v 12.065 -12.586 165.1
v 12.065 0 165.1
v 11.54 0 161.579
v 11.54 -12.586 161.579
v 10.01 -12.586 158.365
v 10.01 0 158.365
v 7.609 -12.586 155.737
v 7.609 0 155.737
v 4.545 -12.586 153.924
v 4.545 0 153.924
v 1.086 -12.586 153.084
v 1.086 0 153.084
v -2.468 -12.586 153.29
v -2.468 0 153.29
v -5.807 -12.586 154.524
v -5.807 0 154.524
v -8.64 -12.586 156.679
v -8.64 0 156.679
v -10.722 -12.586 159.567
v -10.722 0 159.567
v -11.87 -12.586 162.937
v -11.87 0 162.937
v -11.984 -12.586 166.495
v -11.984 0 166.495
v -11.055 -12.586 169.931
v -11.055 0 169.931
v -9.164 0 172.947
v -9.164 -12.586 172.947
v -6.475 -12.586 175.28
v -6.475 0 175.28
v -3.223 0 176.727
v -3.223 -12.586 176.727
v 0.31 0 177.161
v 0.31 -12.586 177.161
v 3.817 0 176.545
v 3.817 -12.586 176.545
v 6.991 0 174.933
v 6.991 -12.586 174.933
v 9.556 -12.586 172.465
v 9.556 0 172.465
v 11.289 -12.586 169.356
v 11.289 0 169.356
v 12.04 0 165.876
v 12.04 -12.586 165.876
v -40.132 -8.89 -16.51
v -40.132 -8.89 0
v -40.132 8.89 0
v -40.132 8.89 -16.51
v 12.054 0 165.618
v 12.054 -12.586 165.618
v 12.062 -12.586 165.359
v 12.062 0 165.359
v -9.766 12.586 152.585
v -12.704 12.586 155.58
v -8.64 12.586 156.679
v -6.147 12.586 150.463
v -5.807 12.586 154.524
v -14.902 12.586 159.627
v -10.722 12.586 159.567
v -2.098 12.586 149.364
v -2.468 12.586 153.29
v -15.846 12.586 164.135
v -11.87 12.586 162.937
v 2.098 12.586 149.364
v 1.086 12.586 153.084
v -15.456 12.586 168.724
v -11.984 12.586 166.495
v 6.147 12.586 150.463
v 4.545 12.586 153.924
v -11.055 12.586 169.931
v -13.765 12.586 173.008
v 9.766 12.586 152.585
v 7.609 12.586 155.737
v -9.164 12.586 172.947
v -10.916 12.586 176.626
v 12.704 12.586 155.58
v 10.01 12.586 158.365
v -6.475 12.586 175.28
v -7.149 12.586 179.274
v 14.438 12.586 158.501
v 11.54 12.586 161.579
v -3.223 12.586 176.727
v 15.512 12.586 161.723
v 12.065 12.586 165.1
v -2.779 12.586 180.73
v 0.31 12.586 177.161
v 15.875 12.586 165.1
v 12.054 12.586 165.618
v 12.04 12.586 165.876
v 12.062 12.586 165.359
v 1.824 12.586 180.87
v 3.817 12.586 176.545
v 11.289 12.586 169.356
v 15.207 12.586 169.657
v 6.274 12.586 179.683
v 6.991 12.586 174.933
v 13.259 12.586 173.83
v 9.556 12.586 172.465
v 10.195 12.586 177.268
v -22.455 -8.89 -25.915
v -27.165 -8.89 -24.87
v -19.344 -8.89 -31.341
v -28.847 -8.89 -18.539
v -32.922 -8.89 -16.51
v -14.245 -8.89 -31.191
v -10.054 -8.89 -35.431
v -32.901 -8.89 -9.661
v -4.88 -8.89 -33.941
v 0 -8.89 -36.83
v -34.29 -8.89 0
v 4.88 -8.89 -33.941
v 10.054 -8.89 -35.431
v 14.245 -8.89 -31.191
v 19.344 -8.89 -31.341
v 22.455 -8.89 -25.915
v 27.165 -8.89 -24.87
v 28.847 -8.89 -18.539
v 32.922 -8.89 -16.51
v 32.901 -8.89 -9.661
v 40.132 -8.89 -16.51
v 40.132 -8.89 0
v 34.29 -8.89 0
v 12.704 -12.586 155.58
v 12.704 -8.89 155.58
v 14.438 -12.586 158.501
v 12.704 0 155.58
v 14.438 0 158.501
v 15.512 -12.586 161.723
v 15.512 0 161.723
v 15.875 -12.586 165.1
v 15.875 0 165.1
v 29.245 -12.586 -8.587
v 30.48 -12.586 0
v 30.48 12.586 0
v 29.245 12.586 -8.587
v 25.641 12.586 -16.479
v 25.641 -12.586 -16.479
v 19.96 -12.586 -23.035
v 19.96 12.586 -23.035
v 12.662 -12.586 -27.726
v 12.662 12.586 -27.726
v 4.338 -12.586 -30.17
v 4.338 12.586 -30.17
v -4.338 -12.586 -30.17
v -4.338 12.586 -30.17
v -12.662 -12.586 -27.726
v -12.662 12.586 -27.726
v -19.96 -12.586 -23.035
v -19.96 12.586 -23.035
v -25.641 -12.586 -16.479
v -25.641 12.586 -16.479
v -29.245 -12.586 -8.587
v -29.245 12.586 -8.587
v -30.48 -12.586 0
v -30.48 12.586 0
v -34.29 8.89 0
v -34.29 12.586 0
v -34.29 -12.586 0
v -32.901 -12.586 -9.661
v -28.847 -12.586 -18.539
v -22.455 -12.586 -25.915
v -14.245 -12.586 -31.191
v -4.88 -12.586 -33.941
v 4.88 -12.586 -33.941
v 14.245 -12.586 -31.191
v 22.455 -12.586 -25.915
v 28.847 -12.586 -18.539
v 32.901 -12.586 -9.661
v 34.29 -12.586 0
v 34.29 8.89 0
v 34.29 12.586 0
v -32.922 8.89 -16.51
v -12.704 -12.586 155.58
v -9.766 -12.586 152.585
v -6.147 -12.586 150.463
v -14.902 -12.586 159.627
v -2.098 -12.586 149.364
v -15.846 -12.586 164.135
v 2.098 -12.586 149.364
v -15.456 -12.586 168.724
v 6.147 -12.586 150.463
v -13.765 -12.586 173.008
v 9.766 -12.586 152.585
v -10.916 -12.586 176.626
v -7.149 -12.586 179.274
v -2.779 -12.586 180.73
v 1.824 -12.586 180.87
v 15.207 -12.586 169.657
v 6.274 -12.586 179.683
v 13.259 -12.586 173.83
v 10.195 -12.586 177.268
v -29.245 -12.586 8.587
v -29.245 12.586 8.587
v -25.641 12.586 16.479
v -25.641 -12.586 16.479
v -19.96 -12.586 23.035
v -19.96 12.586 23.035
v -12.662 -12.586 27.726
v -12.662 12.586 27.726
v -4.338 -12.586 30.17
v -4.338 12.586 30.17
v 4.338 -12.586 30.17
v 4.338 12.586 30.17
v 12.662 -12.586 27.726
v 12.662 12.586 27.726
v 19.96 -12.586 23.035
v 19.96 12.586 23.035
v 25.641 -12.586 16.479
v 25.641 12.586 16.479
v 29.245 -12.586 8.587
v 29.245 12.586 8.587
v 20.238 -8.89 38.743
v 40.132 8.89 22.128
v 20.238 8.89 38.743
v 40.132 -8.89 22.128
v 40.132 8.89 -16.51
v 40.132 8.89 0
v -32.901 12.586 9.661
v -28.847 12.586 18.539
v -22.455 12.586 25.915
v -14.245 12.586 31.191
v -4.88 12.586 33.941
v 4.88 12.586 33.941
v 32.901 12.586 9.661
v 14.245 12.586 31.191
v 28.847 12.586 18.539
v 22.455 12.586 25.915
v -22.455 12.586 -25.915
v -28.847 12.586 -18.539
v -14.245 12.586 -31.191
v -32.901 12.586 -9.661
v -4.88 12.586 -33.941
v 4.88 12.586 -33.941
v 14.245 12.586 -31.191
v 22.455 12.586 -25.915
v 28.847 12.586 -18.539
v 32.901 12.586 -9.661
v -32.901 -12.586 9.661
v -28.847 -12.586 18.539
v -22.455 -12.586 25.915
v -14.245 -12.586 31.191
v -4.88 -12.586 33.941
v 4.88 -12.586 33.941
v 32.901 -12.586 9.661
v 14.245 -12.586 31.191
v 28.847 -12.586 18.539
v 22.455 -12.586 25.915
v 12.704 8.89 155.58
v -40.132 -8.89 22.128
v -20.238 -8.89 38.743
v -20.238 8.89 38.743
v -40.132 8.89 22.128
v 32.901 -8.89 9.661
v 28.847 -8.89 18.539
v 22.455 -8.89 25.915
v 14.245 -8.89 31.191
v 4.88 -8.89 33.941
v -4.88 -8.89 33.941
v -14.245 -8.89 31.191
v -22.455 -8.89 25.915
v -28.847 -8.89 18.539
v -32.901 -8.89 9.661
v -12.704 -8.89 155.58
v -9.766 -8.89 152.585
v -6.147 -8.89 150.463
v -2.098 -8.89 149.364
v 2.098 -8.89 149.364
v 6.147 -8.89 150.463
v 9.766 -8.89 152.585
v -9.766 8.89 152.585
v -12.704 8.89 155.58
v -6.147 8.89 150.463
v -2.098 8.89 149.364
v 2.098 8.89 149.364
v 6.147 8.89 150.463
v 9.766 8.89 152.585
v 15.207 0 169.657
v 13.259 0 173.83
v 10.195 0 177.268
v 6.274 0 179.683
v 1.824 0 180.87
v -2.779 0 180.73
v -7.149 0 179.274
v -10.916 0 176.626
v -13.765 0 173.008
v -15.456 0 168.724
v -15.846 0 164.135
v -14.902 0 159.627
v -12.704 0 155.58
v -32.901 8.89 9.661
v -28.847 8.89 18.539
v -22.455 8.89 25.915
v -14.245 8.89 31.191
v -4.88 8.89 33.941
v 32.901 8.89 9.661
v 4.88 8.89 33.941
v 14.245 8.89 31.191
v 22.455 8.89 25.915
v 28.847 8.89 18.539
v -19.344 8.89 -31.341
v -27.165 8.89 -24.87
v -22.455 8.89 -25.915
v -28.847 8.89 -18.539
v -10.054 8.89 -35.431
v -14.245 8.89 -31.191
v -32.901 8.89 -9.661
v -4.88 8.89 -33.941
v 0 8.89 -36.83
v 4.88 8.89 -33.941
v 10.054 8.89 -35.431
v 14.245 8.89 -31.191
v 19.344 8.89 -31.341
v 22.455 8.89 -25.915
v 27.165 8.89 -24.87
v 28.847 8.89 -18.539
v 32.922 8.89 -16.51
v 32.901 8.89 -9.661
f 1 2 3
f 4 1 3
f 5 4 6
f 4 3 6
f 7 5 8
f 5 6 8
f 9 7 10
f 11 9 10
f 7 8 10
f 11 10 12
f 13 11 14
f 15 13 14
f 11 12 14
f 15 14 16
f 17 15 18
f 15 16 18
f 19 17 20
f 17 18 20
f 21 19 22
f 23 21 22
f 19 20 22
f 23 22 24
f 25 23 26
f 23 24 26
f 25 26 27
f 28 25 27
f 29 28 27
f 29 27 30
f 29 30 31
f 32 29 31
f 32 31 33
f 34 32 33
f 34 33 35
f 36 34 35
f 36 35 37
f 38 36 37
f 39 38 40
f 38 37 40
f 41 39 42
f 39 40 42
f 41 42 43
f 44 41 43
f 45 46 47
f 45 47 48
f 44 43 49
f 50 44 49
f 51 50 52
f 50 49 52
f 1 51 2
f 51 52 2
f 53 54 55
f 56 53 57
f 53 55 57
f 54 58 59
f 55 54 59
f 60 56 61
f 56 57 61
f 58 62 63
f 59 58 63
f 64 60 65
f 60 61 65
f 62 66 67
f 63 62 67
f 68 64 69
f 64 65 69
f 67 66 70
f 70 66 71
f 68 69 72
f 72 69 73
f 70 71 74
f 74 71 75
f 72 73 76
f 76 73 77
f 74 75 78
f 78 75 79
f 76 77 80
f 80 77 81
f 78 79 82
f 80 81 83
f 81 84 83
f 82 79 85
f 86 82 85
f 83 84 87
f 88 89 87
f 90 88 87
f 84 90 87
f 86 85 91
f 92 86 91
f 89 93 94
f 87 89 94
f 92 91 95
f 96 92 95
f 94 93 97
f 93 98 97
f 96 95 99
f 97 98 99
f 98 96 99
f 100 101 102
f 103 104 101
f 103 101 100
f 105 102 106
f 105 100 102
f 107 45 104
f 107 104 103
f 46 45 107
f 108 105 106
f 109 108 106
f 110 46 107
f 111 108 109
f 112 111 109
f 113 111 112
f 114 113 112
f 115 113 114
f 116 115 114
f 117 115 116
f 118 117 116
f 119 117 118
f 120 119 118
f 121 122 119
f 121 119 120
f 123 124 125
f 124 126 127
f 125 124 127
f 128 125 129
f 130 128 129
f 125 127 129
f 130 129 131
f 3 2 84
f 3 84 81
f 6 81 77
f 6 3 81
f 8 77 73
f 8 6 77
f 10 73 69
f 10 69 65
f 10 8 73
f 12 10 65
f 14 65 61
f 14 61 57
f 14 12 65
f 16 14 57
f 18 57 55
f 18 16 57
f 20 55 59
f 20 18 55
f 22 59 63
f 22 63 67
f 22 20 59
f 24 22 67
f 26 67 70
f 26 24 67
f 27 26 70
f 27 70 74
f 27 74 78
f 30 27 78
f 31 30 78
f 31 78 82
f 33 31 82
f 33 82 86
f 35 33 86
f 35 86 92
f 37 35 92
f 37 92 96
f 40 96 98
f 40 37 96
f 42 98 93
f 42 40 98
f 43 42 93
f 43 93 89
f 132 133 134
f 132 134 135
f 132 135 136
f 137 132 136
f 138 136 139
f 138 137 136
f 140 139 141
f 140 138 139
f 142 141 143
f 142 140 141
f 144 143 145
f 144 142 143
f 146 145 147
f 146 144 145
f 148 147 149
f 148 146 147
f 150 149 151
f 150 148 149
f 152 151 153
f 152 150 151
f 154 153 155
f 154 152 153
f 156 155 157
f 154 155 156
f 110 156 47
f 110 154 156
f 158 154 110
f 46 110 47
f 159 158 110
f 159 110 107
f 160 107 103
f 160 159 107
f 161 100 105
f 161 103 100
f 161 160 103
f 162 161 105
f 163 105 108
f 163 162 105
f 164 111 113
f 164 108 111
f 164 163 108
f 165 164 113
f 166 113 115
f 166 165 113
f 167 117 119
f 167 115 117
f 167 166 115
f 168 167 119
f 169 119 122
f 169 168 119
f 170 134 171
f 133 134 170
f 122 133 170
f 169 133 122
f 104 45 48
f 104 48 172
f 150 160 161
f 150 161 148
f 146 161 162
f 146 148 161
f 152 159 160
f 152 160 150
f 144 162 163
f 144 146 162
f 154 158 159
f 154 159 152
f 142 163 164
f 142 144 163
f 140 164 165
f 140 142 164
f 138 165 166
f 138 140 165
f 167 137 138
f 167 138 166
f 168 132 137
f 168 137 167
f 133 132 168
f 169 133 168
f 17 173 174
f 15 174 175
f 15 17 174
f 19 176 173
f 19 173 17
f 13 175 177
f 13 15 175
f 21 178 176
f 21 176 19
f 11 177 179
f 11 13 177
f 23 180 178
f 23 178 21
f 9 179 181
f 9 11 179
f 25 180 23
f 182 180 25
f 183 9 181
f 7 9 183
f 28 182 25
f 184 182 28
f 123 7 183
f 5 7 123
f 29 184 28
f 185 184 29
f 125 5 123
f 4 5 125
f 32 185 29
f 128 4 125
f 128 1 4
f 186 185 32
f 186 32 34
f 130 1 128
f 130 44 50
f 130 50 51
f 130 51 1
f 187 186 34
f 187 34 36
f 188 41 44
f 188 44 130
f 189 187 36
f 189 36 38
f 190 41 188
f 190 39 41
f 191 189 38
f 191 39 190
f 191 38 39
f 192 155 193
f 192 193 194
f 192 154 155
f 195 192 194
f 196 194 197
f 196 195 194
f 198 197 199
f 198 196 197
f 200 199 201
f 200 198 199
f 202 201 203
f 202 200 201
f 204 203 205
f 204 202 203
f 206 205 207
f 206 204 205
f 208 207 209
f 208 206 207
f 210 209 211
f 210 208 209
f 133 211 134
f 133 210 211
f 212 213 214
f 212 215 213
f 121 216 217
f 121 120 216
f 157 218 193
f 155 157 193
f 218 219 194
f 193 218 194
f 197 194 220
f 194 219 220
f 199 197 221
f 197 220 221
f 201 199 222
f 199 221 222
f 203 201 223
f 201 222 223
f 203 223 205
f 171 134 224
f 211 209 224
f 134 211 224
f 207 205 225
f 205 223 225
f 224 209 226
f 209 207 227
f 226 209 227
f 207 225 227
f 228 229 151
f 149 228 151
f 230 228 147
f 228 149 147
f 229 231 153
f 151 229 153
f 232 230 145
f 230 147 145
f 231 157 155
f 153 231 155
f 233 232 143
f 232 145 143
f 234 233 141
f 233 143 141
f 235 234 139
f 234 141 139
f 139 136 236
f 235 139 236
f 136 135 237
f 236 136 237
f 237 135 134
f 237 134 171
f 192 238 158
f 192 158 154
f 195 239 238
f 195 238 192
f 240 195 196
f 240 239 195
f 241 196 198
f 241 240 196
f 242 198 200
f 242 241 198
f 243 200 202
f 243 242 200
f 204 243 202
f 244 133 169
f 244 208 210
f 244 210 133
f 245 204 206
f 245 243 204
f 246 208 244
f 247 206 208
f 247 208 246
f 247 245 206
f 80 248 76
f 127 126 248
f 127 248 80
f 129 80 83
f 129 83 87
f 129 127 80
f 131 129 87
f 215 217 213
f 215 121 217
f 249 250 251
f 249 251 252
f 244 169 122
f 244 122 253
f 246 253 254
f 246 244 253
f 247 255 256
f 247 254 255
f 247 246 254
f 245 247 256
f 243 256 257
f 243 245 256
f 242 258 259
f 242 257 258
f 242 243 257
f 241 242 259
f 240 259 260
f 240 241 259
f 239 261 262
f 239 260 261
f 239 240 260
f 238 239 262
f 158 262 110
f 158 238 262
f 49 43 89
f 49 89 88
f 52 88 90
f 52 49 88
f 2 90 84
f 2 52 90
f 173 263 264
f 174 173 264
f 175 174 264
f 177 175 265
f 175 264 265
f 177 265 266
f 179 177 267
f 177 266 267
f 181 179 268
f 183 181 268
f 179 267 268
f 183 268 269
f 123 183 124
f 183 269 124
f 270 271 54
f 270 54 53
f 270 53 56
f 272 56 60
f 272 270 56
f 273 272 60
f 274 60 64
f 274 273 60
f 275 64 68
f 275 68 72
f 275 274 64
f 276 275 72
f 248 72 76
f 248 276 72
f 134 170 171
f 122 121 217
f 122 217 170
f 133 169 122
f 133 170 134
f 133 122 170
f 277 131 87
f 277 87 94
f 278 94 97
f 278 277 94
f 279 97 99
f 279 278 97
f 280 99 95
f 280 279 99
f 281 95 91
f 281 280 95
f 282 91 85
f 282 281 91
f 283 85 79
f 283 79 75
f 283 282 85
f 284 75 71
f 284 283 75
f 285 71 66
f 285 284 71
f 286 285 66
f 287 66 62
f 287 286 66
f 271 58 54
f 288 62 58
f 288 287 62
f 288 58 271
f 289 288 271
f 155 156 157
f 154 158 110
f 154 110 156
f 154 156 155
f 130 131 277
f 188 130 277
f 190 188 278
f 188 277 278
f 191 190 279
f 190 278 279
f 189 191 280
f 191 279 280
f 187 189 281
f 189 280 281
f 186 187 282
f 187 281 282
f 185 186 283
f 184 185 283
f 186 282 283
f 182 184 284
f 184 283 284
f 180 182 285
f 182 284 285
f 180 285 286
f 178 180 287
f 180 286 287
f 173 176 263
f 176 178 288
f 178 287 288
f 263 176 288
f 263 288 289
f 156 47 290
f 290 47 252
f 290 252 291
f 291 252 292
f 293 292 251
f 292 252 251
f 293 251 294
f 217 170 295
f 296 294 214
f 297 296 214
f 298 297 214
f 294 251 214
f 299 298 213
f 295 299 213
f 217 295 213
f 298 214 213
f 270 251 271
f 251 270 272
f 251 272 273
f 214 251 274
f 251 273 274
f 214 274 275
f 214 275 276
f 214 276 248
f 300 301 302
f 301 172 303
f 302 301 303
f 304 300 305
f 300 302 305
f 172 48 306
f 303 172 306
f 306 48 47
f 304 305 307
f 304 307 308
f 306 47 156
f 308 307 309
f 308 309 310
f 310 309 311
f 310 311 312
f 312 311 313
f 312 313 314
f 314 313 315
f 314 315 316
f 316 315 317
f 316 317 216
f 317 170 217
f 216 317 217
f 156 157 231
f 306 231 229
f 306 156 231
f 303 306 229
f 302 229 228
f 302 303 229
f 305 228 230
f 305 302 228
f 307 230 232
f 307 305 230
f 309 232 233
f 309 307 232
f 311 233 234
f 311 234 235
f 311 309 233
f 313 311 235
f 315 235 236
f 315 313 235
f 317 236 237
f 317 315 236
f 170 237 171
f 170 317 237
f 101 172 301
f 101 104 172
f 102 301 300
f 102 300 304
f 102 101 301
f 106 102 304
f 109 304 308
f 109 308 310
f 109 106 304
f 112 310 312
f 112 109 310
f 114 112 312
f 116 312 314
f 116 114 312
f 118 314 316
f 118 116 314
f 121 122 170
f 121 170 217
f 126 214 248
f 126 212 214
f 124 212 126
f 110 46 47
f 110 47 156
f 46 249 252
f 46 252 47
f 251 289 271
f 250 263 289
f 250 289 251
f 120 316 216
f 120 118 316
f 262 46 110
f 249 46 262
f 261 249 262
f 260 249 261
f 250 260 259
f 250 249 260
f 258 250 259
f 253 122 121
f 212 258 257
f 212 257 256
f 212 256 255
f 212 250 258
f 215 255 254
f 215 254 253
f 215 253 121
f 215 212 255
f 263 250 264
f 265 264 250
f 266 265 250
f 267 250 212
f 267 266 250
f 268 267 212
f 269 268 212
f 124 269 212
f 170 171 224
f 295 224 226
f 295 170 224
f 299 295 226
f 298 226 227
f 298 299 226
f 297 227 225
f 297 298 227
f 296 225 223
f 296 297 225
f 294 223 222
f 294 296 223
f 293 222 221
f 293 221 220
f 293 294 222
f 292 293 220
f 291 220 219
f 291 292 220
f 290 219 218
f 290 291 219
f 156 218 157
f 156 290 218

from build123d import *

# Parameters (mm, degrees)
F1_DEPTH = 12.5857
F2_DEPTH = 12.5857
F3_DEPTH = 8.89
F4_DEPTH = 12.5857
F5_DEPTH = 8.89


with BuildPart() as f1:
    # F0 (on Front) → F1 (new body, symmetric)
    with BuildSketch(Plane.XZ):
        with BuildLine():
            Line((30.48, 0), (34.29, 0))
            ThreePointArc((34.29, 0), (0, 34.29), (-34.29, 0))
            Line((-34.29, 0), (-30.48, 0))
            ThreePointArc((-30.48, 0), (0, 30.48), (30.48, 0))
        make_face()
    extrude(amount=F1_DEPTH, both=True)



with BuildPart() as f2:
    # F0 (on Front) → F2 (new body, symmetric)
    with BuildSketch(Plane.XZ):
        with BuildLine():
            ThreePointArc((12.0399923395, 165.876408053), (12.0587464642, 165.4884053449), (12.065, 165.1))
            ThreePointArc((12.065, 165.1), (-0.3884053449, 153.0412535358), (-12.0399923395, 165.876408053))
            Line((-12.0399923395, 165.876408053), (-12.7039469543, 155.5802648785))
            ThreePointArc((-12.7039469543, 155.5802648785), (0, 149.225), (12.7039469543, 155.5802648785))
            Line((12.7039469543, 155.5802648785), (12.0399923395, 165.876408053))
        make_face()
        with BuildLine():
            ThreePointArc((-12.0399923395, 165.876408053), (0, 177.165), (12.0399923395, 165.876408053))
            Line((12.0399923395, 165.876408053), (12.7039469543, 155.5802648785))
            ThreePointArc((12.7039469543, 155.5802648785), (15.0613874344, 160.0830055262), (15.875, 165.1))
            ThreePointArc((15.875, 165.1), (-5.0169944738, 180.1613874344), (-12.7039469543, 155.5802648785))
            Line((-12.7039469543, 155.5802648785), (-12.0399923395, 165.876408053))
        make_face()
    extrude(amount=F2_DEPTH, both=True)


with BuildPart() as f1_1:
    add(f1.part)

    add(f2.part)  # F3 merges F2
    # F0 (on Front) → F3 (join, symmetric)
    with BuildSketch(Plane.XZ):
        with BuildLine():
            Line((20.2382598072, 38.7434177101), (12.7039469543, 155.5802648785))
            ThreePointArc((12.7039469543, 155.5802648785), (0, 149.225), (-12.7039469543, 155.5802648785))
            Line((-12.7039469543, 155.5802648785), (-20.2382598072, 38.7434177101))
            Line((-20.2382598072, 38.7434177101), (-40.132, 22.128129378))
            Line((-40.132, 22.128129378), (-40.132, 0))
            Line((-40.132, 0), (-34.29, 0))
            ThreePointArc((-34.29, 0), (0, 34.29), (34.29, 0))
            Line((34.29, 0), (40.132, 0))
            Line((40.132, 0), (40.132, 22.128129378))
            Line((40.132, 22.128129378), (20.2382598072, 38.7434177101))
        make_face()
    extrude(amount=F3_DEPTH, both=True)


with BuildPart() as f4:
    # F0 (on Front) → F4 (new body, symmetric)
    with BuildSketch(Plane.XZ):
        with BuildLine():
            ThreePointArc((-34.29, 0), (0, -34.29), (34.29, 0))
            Line((34.29, 0), (30.48, 0))
            ThreePointArc((30.48, 0), (0, -30.48), (-30.48, 0))
            Line((-30.48, 0), (-34.29, 0))
        make_face()
    extrude(amount=F4_DEPTH, both=True)

    # F0 (on Front) → F5 (join, symmetric)
    with BuildSketch(Plane.XZ):
        with BuildLine():
            Line((40.132, -16.51), (40.132, 0))
            Line((40.132, 0), (34.29, 0))
            ThreePointArc((34.29, 0), (0, -34.29), (-34.29, 0))
            Line((-34.29, 0), (-40.132, 0))
            Line((-40.132, 0), (-40.132, -16.51))
            Line((-40.132, -16.51), (-32.9221627479, -16.51))
            ThreePointArc((-32.9221627479, -16.51), (0, -36.83), (32.9221627479, -16.51))
            Line((32.9221627479, -16.51), (40.132, -16.51))
        make_face()
    extrude(amount=F5_DEPTH, both=True)


solid = Compound([f1_1.part, f4.part])
